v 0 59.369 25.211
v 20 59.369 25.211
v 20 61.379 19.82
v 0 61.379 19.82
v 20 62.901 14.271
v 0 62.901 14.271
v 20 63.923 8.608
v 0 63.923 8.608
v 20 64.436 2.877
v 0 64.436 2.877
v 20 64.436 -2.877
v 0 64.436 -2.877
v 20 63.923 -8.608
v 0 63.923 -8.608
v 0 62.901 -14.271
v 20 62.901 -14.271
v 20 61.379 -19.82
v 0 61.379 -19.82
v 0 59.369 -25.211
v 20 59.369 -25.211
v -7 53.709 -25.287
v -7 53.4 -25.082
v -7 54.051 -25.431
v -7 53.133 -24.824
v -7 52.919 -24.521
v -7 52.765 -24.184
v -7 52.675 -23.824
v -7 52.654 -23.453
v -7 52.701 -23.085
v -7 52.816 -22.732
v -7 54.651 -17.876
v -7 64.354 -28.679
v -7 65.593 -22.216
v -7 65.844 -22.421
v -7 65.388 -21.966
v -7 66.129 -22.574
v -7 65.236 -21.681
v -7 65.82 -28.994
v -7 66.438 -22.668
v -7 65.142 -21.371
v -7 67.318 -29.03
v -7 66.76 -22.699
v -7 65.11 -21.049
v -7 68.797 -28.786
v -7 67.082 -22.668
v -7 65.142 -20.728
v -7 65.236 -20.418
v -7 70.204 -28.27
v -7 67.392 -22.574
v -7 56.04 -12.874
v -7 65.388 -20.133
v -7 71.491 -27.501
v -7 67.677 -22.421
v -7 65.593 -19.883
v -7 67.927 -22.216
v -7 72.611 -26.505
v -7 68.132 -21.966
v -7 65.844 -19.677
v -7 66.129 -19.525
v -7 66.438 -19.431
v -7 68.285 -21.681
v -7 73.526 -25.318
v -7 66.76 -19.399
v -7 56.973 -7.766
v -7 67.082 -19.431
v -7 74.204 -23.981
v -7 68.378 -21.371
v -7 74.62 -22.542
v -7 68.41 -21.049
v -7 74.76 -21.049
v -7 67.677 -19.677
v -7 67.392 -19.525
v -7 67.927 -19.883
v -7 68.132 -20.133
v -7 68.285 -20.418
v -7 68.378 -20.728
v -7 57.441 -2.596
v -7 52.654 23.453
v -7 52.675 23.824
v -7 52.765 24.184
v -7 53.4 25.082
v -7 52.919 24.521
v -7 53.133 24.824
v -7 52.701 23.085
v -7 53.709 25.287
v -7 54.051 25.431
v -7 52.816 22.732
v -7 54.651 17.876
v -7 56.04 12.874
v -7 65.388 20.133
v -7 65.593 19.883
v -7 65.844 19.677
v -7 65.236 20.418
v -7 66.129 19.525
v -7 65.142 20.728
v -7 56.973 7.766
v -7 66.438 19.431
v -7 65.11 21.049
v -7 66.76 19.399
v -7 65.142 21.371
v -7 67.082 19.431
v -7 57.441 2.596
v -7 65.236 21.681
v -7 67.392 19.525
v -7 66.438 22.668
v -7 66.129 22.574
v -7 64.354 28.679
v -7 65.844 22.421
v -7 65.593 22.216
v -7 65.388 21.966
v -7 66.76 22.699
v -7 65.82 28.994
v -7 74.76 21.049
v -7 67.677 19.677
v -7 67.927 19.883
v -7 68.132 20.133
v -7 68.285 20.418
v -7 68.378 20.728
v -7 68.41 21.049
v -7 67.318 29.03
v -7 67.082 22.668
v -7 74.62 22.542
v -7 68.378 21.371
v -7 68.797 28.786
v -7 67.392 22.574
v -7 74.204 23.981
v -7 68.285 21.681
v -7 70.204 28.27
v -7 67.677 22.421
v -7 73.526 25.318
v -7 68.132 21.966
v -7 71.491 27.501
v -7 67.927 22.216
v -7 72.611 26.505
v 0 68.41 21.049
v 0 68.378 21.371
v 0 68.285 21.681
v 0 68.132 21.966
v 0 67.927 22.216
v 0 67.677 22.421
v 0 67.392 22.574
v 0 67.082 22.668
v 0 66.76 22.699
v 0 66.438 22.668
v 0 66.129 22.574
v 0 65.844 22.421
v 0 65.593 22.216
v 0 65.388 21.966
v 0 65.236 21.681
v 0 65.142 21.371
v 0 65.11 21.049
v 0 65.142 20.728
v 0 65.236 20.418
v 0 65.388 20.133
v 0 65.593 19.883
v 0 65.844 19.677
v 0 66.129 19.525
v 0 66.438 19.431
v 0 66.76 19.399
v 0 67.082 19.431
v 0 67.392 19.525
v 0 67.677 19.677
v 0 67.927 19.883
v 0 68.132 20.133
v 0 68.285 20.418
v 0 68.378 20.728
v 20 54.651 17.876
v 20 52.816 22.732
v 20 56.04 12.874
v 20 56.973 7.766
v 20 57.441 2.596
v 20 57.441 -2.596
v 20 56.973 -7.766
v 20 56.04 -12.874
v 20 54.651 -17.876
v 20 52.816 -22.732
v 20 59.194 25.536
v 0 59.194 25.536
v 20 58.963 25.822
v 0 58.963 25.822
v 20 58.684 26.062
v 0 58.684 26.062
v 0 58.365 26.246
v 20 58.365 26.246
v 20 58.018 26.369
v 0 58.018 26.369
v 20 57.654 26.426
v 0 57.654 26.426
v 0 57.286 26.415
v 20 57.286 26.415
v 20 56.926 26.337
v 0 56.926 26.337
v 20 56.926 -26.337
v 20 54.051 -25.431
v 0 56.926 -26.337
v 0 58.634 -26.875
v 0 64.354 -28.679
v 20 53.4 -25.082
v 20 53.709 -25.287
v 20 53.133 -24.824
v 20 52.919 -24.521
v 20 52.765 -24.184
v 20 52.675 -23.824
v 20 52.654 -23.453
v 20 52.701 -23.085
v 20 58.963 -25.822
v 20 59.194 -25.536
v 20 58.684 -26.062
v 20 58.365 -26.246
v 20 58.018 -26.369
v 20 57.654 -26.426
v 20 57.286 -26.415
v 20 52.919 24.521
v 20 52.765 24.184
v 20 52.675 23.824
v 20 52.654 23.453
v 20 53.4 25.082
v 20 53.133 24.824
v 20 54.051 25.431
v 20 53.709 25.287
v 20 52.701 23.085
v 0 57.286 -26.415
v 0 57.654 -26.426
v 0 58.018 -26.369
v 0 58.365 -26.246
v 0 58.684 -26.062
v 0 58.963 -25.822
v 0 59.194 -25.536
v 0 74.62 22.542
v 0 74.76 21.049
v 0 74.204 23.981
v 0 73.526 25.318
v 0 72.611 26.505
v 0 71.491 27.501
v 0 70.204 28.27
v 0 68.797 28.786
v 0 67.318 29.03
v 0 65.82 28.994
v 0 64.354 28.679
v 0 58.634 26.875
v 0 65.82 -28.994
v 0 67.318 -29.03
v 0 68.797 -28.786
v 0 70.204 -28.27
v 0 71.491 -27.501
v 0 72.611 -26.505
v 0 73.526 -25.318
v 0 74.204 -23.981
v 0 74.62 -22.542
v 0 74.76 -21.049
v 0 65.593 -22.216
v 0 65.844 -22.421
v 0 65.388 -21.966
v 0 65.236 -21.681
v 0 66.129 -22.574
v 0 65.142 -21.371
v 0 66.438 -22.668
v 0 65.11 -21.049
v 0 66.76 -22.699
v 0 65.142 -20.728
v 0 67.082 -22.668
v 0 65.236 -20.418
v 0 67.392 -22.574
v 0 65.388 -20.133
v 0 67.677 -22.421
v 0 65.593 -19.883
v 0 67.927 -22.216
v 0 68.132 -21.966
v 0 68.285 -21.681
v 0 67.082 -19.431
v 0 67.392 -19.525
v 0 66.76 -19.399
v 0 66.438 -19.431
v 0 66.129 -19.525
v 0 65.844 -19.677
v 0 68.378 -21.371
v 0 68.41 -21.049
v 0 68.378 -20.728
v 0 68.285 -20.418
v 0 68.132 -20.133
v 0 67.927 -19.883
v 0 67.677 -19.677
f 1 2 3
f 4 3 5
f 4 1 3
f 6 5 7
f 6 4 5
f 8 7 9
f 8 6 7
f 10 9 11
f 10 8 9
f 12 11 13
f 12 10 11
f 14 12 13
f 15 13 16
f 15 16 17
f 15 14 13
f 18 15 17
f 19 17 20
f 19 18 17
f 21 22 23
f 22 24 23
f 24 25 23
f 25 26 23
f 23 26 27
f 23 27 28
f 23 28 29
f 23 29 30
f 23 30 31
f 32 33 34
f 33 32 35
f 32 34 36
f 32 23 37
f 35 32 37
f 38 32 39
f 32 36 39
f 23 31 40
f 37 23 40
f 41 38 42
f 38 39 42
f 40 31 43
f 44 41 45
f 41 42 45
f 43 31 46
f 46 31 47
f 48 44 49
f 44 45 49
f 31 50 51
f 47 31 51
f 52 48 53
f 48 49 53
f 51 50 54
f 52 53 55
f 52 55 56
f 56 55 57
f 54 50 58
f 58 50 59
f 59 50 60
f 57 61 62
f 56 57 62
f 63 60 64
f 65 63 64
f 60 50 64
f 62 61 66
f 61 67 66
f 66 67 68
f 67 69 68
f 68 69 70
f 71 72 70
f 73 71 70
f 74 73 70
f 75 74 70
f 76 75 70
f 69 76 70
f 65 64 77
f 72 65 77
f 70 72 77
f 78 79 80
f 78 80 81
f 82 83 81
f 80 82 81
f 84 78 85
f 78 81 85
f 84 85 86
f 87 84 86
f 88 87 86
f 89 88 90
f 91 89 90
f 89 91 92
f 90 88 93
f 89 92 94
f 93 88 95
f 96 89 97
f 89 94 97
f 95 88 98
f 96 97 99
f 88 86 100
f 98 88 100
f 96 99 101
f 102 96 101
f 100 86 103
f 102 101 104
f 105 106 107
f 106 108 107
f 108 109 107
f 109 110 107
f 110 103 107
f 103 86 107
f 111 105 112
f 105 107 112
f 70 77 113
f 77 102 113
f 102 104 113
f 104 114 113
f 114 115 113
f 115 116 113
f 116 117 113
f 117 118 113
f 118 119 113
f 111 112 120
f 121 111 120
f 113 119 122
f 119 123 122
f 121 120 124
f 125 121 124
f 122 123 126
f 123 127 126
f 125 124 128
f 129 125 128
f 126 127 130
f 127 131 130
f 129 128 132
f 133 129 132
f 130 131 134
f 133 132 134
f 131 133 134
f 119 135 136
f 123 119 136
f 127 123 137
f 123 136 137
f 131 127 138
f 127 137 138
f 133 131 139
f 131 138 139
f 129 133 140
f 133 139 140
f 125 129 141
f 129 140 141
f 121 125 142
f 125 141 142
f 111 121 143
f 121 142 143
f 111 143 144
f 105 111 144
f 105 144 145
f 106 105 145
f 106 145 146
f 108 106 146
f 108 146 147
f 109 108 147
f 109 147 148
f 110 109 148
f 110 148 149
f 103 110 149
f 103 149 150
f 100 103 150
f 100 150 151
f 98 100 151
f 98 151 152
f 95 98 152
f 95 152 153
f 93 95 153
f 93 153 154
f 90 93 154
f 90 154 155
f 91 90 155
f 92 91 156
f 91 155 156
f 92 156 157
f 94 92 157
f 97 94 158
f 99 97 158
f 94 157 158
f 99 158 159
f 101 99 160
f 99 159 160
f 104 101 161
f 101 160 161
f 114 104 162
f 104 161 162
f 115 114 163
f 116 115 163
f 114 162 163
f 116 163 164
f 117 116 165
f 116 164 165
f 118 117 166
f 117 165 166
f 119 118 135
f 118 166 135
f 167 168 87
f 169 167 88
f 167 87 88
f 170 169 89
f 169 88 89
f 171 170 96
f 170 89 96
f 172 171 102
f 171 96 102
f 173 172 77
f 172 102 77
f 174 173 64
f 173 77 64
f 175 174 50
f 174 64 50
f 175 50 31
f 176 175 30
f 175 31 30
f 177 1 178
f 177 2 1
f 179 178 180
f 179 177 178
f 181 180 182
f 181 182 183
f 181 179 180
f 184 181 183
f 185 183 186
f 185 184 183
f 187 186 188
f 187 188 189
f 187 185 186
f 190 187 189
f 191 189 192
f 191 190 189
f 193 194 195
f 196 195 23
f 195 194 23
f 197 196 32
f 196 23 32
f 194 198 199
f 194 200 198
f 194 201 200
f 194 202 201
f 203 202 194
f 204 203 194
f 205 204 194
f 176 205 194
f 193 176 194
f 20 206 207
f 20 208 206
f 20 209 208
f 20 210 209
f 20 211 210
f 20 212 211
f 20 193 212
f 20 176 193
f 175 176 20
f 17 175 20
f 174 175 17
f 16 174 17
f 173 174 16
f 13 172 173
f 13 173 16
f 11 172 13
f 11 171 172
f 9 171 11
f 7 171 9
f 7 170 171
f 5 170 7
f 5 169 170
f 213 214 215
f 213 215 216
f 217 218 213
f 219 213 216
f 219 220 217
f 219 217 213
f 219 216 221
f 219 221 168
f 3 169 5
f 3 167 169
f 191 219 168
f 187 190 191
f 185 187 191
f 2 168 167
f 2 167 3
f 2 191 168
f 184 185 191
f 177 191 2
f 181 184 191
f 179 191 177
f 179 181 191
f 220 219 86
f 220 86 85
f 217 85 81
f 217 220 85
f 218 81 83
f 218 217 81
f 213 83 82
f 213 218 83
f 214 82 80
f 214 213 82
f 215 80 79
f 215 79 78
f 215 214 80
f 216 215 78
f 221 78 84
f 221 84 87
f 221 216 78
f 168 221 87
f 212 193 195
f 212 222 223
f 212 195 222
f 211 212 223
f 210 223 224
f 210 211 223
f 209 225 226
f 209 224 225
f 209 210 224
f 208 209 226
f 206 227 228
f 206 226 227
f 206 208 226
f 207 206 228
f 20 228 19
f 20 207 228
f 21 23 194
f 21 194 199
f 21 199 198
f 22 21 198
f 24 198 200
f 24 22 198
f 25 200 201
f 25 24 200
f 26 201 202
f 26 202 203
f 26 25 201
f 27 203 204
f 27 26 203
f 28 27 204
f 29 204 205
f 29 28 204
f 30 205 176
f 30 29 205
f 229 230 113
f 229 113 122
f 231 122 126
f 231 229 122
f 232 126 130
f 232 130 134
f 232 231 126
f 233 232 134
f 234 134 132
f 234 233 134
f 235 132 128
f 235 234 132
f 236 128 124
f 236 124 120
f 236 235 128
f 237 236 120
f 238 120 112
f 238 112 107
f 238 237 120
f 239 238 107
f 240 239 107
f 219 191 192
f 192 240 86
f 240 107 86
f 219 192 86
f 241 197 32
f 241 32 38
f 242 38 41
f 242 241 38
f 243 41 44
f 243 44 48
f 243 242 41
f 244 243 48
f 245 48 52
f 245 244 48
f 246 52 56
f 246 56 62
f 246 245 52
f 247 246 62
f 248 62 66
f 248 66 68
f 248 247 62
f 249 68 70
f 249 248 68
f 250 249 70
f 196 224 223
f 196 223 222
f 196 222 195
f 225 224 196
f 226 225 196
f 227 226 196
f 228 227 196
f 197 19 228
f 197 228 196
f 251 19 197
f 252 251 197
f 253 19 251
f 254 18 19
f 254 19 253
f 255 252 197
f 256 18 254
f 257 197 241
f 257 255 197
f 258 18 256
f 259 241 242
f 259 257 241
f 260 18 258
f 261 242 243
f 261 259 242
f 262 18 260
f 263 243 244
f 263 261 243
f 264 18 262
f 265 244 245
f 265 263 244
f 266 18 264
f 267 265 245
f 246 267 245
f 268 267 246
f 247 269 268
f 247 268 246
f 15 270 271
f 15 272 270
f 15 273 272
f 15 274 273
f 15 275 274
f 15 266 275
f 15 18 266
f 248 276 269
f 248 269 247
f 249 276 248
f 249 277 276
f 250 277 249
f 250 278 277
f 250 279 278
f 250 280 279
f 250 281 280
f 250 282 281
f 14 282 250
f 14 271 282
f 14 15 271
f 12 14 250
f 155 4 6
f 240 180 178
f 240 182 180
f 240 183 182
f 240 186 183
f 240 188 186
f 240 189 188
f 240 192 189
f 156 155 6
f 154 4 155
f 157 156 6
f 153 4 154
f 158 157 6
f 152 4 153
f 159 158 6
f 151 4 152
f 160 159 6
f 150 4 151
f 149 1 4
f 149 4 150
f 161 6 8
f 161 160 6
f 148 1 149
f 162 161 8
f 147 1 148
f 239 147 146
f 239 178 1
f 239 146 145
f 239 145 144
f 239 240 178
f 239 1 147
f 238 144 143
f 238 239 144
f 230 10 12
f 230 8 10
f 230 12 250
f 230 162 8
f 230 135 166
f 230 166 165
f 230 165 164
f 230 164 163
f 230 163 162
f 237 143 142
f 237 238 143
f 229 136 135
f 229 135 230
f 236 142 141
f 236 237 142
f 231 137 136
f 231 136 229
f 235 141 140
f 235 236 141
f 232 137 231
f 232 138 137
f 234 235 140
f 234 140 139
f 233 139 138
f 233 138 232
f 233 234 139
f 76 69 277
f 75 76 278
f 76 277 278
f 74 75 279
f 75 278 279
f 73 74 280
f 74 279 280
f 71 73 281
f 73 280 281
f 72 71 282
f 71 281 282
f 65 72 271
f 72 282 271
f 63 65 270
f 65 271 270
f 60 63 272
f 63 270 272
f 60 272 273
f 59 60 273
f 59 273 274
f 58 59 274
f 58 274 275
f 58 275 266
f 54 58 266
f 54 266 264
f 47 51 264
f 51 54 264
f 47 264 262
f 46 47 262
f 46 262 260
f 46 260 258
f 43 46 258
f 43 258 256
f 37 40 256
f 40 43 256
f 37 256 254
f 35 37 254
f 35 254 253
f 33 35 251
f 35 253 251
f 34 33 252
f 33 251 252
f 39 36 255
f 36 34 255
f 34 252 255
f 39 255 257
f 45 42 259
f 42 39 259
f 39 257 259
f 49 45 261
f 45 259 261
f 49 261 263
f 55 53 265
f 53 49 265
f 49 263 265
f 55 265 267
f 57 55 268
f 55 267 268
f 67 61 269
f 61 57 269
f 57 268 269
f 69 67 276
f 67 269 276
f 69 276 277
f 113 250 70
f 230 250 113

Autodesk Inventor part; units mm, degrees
ref_plane "YZ Plane" through (0, 0, 0) normal (1, 0, 0) x (0, 1, 0)
ref_plane "XZ Plane" through (0, 0, 0) normal (0, 1, 0) x (-1, 0, 0)
ref_plane "XY Plane" through (0, 0, 0) normal (0, 0, 1) x (1, 0, 0)
sketch "Sketch1" plane through (0, 0, 0) normal (1, 0, 0) x (0, 1, 0)
  circle A0 centre (0, 0) radius 70
  line L0 (0, 0) -> (66.7602, 21.0494) construction
  line L1 (66.7602, -21.0494) -> (0, 0) construction
  line L2 (66.7602, -21.0494) -> (66.7602, 21.0494) construction
  circle A1 centre (66.7602, 21.0494) radius 1.65
  circle A2 centre (66.7602, -21.0494) radius 1.65
  circle A3 centre (0, 0) radius 57.5
  line L3 (64.3545, 28.6791) -> (-26.6041, 0)
  line L4 (-26.6041, 0) -> (64.3545, -28.6791)
  line L5 (74.7602, -21.0494) -> (74.7602, 21.0494)
  arc A4 (74.7602, 21.0494) -> (64.3545, 28.6791) centre (66.7602, 21.0494) ccw
  arc A5 (64.3545, -28.6791) -> (74.7602, -21.0494) centre (66.7602, -21.0494) ccw
  circle A6 centre (0, 0) radius 64.5
  point P0 (66.7602, 0)
  point P1 (51.8997, 24.7522)
  point P2 (51.8997, -24.7522)
  point P3 (58.6341, 26.8755)
  point P4 (58.6341, -26.8755)
  dimension "d0" = 140
  dimension "d1" = 35
  dimension "d2" = 3.3
  dimension "d3" = 3.3
  dimension "d4" = 115
  dimension "d5" = 8
  dimension "d6" = 8
  dimension "d7" = 7
extrude "Extrusion1" add sketch "Sketch1" against normal blind 7 contours A0 A2 L4 A6 L3 A1 | A0 A1 L3 A4 L5 A5 L4 A2 | A6 L4 A3 L3 picked at (61.9464, 3.0696)
extrude "Extrusion2" add sketch "Sketch1" along normal blind 20 contours A6 L4 A3 L3 picked at (61.9464, 3.0696)
fillet "Fillet1" radius 2 4 edges at (6.5, 51.8997, 24.7522) (6.5, 51.8997, -24.7522) (10, 58.6341, 26.8755) (10, 58.6341, -26.8755)
properties part number "ACOMPLE_PLASTICO" material "Steel, Mild, Welded"
